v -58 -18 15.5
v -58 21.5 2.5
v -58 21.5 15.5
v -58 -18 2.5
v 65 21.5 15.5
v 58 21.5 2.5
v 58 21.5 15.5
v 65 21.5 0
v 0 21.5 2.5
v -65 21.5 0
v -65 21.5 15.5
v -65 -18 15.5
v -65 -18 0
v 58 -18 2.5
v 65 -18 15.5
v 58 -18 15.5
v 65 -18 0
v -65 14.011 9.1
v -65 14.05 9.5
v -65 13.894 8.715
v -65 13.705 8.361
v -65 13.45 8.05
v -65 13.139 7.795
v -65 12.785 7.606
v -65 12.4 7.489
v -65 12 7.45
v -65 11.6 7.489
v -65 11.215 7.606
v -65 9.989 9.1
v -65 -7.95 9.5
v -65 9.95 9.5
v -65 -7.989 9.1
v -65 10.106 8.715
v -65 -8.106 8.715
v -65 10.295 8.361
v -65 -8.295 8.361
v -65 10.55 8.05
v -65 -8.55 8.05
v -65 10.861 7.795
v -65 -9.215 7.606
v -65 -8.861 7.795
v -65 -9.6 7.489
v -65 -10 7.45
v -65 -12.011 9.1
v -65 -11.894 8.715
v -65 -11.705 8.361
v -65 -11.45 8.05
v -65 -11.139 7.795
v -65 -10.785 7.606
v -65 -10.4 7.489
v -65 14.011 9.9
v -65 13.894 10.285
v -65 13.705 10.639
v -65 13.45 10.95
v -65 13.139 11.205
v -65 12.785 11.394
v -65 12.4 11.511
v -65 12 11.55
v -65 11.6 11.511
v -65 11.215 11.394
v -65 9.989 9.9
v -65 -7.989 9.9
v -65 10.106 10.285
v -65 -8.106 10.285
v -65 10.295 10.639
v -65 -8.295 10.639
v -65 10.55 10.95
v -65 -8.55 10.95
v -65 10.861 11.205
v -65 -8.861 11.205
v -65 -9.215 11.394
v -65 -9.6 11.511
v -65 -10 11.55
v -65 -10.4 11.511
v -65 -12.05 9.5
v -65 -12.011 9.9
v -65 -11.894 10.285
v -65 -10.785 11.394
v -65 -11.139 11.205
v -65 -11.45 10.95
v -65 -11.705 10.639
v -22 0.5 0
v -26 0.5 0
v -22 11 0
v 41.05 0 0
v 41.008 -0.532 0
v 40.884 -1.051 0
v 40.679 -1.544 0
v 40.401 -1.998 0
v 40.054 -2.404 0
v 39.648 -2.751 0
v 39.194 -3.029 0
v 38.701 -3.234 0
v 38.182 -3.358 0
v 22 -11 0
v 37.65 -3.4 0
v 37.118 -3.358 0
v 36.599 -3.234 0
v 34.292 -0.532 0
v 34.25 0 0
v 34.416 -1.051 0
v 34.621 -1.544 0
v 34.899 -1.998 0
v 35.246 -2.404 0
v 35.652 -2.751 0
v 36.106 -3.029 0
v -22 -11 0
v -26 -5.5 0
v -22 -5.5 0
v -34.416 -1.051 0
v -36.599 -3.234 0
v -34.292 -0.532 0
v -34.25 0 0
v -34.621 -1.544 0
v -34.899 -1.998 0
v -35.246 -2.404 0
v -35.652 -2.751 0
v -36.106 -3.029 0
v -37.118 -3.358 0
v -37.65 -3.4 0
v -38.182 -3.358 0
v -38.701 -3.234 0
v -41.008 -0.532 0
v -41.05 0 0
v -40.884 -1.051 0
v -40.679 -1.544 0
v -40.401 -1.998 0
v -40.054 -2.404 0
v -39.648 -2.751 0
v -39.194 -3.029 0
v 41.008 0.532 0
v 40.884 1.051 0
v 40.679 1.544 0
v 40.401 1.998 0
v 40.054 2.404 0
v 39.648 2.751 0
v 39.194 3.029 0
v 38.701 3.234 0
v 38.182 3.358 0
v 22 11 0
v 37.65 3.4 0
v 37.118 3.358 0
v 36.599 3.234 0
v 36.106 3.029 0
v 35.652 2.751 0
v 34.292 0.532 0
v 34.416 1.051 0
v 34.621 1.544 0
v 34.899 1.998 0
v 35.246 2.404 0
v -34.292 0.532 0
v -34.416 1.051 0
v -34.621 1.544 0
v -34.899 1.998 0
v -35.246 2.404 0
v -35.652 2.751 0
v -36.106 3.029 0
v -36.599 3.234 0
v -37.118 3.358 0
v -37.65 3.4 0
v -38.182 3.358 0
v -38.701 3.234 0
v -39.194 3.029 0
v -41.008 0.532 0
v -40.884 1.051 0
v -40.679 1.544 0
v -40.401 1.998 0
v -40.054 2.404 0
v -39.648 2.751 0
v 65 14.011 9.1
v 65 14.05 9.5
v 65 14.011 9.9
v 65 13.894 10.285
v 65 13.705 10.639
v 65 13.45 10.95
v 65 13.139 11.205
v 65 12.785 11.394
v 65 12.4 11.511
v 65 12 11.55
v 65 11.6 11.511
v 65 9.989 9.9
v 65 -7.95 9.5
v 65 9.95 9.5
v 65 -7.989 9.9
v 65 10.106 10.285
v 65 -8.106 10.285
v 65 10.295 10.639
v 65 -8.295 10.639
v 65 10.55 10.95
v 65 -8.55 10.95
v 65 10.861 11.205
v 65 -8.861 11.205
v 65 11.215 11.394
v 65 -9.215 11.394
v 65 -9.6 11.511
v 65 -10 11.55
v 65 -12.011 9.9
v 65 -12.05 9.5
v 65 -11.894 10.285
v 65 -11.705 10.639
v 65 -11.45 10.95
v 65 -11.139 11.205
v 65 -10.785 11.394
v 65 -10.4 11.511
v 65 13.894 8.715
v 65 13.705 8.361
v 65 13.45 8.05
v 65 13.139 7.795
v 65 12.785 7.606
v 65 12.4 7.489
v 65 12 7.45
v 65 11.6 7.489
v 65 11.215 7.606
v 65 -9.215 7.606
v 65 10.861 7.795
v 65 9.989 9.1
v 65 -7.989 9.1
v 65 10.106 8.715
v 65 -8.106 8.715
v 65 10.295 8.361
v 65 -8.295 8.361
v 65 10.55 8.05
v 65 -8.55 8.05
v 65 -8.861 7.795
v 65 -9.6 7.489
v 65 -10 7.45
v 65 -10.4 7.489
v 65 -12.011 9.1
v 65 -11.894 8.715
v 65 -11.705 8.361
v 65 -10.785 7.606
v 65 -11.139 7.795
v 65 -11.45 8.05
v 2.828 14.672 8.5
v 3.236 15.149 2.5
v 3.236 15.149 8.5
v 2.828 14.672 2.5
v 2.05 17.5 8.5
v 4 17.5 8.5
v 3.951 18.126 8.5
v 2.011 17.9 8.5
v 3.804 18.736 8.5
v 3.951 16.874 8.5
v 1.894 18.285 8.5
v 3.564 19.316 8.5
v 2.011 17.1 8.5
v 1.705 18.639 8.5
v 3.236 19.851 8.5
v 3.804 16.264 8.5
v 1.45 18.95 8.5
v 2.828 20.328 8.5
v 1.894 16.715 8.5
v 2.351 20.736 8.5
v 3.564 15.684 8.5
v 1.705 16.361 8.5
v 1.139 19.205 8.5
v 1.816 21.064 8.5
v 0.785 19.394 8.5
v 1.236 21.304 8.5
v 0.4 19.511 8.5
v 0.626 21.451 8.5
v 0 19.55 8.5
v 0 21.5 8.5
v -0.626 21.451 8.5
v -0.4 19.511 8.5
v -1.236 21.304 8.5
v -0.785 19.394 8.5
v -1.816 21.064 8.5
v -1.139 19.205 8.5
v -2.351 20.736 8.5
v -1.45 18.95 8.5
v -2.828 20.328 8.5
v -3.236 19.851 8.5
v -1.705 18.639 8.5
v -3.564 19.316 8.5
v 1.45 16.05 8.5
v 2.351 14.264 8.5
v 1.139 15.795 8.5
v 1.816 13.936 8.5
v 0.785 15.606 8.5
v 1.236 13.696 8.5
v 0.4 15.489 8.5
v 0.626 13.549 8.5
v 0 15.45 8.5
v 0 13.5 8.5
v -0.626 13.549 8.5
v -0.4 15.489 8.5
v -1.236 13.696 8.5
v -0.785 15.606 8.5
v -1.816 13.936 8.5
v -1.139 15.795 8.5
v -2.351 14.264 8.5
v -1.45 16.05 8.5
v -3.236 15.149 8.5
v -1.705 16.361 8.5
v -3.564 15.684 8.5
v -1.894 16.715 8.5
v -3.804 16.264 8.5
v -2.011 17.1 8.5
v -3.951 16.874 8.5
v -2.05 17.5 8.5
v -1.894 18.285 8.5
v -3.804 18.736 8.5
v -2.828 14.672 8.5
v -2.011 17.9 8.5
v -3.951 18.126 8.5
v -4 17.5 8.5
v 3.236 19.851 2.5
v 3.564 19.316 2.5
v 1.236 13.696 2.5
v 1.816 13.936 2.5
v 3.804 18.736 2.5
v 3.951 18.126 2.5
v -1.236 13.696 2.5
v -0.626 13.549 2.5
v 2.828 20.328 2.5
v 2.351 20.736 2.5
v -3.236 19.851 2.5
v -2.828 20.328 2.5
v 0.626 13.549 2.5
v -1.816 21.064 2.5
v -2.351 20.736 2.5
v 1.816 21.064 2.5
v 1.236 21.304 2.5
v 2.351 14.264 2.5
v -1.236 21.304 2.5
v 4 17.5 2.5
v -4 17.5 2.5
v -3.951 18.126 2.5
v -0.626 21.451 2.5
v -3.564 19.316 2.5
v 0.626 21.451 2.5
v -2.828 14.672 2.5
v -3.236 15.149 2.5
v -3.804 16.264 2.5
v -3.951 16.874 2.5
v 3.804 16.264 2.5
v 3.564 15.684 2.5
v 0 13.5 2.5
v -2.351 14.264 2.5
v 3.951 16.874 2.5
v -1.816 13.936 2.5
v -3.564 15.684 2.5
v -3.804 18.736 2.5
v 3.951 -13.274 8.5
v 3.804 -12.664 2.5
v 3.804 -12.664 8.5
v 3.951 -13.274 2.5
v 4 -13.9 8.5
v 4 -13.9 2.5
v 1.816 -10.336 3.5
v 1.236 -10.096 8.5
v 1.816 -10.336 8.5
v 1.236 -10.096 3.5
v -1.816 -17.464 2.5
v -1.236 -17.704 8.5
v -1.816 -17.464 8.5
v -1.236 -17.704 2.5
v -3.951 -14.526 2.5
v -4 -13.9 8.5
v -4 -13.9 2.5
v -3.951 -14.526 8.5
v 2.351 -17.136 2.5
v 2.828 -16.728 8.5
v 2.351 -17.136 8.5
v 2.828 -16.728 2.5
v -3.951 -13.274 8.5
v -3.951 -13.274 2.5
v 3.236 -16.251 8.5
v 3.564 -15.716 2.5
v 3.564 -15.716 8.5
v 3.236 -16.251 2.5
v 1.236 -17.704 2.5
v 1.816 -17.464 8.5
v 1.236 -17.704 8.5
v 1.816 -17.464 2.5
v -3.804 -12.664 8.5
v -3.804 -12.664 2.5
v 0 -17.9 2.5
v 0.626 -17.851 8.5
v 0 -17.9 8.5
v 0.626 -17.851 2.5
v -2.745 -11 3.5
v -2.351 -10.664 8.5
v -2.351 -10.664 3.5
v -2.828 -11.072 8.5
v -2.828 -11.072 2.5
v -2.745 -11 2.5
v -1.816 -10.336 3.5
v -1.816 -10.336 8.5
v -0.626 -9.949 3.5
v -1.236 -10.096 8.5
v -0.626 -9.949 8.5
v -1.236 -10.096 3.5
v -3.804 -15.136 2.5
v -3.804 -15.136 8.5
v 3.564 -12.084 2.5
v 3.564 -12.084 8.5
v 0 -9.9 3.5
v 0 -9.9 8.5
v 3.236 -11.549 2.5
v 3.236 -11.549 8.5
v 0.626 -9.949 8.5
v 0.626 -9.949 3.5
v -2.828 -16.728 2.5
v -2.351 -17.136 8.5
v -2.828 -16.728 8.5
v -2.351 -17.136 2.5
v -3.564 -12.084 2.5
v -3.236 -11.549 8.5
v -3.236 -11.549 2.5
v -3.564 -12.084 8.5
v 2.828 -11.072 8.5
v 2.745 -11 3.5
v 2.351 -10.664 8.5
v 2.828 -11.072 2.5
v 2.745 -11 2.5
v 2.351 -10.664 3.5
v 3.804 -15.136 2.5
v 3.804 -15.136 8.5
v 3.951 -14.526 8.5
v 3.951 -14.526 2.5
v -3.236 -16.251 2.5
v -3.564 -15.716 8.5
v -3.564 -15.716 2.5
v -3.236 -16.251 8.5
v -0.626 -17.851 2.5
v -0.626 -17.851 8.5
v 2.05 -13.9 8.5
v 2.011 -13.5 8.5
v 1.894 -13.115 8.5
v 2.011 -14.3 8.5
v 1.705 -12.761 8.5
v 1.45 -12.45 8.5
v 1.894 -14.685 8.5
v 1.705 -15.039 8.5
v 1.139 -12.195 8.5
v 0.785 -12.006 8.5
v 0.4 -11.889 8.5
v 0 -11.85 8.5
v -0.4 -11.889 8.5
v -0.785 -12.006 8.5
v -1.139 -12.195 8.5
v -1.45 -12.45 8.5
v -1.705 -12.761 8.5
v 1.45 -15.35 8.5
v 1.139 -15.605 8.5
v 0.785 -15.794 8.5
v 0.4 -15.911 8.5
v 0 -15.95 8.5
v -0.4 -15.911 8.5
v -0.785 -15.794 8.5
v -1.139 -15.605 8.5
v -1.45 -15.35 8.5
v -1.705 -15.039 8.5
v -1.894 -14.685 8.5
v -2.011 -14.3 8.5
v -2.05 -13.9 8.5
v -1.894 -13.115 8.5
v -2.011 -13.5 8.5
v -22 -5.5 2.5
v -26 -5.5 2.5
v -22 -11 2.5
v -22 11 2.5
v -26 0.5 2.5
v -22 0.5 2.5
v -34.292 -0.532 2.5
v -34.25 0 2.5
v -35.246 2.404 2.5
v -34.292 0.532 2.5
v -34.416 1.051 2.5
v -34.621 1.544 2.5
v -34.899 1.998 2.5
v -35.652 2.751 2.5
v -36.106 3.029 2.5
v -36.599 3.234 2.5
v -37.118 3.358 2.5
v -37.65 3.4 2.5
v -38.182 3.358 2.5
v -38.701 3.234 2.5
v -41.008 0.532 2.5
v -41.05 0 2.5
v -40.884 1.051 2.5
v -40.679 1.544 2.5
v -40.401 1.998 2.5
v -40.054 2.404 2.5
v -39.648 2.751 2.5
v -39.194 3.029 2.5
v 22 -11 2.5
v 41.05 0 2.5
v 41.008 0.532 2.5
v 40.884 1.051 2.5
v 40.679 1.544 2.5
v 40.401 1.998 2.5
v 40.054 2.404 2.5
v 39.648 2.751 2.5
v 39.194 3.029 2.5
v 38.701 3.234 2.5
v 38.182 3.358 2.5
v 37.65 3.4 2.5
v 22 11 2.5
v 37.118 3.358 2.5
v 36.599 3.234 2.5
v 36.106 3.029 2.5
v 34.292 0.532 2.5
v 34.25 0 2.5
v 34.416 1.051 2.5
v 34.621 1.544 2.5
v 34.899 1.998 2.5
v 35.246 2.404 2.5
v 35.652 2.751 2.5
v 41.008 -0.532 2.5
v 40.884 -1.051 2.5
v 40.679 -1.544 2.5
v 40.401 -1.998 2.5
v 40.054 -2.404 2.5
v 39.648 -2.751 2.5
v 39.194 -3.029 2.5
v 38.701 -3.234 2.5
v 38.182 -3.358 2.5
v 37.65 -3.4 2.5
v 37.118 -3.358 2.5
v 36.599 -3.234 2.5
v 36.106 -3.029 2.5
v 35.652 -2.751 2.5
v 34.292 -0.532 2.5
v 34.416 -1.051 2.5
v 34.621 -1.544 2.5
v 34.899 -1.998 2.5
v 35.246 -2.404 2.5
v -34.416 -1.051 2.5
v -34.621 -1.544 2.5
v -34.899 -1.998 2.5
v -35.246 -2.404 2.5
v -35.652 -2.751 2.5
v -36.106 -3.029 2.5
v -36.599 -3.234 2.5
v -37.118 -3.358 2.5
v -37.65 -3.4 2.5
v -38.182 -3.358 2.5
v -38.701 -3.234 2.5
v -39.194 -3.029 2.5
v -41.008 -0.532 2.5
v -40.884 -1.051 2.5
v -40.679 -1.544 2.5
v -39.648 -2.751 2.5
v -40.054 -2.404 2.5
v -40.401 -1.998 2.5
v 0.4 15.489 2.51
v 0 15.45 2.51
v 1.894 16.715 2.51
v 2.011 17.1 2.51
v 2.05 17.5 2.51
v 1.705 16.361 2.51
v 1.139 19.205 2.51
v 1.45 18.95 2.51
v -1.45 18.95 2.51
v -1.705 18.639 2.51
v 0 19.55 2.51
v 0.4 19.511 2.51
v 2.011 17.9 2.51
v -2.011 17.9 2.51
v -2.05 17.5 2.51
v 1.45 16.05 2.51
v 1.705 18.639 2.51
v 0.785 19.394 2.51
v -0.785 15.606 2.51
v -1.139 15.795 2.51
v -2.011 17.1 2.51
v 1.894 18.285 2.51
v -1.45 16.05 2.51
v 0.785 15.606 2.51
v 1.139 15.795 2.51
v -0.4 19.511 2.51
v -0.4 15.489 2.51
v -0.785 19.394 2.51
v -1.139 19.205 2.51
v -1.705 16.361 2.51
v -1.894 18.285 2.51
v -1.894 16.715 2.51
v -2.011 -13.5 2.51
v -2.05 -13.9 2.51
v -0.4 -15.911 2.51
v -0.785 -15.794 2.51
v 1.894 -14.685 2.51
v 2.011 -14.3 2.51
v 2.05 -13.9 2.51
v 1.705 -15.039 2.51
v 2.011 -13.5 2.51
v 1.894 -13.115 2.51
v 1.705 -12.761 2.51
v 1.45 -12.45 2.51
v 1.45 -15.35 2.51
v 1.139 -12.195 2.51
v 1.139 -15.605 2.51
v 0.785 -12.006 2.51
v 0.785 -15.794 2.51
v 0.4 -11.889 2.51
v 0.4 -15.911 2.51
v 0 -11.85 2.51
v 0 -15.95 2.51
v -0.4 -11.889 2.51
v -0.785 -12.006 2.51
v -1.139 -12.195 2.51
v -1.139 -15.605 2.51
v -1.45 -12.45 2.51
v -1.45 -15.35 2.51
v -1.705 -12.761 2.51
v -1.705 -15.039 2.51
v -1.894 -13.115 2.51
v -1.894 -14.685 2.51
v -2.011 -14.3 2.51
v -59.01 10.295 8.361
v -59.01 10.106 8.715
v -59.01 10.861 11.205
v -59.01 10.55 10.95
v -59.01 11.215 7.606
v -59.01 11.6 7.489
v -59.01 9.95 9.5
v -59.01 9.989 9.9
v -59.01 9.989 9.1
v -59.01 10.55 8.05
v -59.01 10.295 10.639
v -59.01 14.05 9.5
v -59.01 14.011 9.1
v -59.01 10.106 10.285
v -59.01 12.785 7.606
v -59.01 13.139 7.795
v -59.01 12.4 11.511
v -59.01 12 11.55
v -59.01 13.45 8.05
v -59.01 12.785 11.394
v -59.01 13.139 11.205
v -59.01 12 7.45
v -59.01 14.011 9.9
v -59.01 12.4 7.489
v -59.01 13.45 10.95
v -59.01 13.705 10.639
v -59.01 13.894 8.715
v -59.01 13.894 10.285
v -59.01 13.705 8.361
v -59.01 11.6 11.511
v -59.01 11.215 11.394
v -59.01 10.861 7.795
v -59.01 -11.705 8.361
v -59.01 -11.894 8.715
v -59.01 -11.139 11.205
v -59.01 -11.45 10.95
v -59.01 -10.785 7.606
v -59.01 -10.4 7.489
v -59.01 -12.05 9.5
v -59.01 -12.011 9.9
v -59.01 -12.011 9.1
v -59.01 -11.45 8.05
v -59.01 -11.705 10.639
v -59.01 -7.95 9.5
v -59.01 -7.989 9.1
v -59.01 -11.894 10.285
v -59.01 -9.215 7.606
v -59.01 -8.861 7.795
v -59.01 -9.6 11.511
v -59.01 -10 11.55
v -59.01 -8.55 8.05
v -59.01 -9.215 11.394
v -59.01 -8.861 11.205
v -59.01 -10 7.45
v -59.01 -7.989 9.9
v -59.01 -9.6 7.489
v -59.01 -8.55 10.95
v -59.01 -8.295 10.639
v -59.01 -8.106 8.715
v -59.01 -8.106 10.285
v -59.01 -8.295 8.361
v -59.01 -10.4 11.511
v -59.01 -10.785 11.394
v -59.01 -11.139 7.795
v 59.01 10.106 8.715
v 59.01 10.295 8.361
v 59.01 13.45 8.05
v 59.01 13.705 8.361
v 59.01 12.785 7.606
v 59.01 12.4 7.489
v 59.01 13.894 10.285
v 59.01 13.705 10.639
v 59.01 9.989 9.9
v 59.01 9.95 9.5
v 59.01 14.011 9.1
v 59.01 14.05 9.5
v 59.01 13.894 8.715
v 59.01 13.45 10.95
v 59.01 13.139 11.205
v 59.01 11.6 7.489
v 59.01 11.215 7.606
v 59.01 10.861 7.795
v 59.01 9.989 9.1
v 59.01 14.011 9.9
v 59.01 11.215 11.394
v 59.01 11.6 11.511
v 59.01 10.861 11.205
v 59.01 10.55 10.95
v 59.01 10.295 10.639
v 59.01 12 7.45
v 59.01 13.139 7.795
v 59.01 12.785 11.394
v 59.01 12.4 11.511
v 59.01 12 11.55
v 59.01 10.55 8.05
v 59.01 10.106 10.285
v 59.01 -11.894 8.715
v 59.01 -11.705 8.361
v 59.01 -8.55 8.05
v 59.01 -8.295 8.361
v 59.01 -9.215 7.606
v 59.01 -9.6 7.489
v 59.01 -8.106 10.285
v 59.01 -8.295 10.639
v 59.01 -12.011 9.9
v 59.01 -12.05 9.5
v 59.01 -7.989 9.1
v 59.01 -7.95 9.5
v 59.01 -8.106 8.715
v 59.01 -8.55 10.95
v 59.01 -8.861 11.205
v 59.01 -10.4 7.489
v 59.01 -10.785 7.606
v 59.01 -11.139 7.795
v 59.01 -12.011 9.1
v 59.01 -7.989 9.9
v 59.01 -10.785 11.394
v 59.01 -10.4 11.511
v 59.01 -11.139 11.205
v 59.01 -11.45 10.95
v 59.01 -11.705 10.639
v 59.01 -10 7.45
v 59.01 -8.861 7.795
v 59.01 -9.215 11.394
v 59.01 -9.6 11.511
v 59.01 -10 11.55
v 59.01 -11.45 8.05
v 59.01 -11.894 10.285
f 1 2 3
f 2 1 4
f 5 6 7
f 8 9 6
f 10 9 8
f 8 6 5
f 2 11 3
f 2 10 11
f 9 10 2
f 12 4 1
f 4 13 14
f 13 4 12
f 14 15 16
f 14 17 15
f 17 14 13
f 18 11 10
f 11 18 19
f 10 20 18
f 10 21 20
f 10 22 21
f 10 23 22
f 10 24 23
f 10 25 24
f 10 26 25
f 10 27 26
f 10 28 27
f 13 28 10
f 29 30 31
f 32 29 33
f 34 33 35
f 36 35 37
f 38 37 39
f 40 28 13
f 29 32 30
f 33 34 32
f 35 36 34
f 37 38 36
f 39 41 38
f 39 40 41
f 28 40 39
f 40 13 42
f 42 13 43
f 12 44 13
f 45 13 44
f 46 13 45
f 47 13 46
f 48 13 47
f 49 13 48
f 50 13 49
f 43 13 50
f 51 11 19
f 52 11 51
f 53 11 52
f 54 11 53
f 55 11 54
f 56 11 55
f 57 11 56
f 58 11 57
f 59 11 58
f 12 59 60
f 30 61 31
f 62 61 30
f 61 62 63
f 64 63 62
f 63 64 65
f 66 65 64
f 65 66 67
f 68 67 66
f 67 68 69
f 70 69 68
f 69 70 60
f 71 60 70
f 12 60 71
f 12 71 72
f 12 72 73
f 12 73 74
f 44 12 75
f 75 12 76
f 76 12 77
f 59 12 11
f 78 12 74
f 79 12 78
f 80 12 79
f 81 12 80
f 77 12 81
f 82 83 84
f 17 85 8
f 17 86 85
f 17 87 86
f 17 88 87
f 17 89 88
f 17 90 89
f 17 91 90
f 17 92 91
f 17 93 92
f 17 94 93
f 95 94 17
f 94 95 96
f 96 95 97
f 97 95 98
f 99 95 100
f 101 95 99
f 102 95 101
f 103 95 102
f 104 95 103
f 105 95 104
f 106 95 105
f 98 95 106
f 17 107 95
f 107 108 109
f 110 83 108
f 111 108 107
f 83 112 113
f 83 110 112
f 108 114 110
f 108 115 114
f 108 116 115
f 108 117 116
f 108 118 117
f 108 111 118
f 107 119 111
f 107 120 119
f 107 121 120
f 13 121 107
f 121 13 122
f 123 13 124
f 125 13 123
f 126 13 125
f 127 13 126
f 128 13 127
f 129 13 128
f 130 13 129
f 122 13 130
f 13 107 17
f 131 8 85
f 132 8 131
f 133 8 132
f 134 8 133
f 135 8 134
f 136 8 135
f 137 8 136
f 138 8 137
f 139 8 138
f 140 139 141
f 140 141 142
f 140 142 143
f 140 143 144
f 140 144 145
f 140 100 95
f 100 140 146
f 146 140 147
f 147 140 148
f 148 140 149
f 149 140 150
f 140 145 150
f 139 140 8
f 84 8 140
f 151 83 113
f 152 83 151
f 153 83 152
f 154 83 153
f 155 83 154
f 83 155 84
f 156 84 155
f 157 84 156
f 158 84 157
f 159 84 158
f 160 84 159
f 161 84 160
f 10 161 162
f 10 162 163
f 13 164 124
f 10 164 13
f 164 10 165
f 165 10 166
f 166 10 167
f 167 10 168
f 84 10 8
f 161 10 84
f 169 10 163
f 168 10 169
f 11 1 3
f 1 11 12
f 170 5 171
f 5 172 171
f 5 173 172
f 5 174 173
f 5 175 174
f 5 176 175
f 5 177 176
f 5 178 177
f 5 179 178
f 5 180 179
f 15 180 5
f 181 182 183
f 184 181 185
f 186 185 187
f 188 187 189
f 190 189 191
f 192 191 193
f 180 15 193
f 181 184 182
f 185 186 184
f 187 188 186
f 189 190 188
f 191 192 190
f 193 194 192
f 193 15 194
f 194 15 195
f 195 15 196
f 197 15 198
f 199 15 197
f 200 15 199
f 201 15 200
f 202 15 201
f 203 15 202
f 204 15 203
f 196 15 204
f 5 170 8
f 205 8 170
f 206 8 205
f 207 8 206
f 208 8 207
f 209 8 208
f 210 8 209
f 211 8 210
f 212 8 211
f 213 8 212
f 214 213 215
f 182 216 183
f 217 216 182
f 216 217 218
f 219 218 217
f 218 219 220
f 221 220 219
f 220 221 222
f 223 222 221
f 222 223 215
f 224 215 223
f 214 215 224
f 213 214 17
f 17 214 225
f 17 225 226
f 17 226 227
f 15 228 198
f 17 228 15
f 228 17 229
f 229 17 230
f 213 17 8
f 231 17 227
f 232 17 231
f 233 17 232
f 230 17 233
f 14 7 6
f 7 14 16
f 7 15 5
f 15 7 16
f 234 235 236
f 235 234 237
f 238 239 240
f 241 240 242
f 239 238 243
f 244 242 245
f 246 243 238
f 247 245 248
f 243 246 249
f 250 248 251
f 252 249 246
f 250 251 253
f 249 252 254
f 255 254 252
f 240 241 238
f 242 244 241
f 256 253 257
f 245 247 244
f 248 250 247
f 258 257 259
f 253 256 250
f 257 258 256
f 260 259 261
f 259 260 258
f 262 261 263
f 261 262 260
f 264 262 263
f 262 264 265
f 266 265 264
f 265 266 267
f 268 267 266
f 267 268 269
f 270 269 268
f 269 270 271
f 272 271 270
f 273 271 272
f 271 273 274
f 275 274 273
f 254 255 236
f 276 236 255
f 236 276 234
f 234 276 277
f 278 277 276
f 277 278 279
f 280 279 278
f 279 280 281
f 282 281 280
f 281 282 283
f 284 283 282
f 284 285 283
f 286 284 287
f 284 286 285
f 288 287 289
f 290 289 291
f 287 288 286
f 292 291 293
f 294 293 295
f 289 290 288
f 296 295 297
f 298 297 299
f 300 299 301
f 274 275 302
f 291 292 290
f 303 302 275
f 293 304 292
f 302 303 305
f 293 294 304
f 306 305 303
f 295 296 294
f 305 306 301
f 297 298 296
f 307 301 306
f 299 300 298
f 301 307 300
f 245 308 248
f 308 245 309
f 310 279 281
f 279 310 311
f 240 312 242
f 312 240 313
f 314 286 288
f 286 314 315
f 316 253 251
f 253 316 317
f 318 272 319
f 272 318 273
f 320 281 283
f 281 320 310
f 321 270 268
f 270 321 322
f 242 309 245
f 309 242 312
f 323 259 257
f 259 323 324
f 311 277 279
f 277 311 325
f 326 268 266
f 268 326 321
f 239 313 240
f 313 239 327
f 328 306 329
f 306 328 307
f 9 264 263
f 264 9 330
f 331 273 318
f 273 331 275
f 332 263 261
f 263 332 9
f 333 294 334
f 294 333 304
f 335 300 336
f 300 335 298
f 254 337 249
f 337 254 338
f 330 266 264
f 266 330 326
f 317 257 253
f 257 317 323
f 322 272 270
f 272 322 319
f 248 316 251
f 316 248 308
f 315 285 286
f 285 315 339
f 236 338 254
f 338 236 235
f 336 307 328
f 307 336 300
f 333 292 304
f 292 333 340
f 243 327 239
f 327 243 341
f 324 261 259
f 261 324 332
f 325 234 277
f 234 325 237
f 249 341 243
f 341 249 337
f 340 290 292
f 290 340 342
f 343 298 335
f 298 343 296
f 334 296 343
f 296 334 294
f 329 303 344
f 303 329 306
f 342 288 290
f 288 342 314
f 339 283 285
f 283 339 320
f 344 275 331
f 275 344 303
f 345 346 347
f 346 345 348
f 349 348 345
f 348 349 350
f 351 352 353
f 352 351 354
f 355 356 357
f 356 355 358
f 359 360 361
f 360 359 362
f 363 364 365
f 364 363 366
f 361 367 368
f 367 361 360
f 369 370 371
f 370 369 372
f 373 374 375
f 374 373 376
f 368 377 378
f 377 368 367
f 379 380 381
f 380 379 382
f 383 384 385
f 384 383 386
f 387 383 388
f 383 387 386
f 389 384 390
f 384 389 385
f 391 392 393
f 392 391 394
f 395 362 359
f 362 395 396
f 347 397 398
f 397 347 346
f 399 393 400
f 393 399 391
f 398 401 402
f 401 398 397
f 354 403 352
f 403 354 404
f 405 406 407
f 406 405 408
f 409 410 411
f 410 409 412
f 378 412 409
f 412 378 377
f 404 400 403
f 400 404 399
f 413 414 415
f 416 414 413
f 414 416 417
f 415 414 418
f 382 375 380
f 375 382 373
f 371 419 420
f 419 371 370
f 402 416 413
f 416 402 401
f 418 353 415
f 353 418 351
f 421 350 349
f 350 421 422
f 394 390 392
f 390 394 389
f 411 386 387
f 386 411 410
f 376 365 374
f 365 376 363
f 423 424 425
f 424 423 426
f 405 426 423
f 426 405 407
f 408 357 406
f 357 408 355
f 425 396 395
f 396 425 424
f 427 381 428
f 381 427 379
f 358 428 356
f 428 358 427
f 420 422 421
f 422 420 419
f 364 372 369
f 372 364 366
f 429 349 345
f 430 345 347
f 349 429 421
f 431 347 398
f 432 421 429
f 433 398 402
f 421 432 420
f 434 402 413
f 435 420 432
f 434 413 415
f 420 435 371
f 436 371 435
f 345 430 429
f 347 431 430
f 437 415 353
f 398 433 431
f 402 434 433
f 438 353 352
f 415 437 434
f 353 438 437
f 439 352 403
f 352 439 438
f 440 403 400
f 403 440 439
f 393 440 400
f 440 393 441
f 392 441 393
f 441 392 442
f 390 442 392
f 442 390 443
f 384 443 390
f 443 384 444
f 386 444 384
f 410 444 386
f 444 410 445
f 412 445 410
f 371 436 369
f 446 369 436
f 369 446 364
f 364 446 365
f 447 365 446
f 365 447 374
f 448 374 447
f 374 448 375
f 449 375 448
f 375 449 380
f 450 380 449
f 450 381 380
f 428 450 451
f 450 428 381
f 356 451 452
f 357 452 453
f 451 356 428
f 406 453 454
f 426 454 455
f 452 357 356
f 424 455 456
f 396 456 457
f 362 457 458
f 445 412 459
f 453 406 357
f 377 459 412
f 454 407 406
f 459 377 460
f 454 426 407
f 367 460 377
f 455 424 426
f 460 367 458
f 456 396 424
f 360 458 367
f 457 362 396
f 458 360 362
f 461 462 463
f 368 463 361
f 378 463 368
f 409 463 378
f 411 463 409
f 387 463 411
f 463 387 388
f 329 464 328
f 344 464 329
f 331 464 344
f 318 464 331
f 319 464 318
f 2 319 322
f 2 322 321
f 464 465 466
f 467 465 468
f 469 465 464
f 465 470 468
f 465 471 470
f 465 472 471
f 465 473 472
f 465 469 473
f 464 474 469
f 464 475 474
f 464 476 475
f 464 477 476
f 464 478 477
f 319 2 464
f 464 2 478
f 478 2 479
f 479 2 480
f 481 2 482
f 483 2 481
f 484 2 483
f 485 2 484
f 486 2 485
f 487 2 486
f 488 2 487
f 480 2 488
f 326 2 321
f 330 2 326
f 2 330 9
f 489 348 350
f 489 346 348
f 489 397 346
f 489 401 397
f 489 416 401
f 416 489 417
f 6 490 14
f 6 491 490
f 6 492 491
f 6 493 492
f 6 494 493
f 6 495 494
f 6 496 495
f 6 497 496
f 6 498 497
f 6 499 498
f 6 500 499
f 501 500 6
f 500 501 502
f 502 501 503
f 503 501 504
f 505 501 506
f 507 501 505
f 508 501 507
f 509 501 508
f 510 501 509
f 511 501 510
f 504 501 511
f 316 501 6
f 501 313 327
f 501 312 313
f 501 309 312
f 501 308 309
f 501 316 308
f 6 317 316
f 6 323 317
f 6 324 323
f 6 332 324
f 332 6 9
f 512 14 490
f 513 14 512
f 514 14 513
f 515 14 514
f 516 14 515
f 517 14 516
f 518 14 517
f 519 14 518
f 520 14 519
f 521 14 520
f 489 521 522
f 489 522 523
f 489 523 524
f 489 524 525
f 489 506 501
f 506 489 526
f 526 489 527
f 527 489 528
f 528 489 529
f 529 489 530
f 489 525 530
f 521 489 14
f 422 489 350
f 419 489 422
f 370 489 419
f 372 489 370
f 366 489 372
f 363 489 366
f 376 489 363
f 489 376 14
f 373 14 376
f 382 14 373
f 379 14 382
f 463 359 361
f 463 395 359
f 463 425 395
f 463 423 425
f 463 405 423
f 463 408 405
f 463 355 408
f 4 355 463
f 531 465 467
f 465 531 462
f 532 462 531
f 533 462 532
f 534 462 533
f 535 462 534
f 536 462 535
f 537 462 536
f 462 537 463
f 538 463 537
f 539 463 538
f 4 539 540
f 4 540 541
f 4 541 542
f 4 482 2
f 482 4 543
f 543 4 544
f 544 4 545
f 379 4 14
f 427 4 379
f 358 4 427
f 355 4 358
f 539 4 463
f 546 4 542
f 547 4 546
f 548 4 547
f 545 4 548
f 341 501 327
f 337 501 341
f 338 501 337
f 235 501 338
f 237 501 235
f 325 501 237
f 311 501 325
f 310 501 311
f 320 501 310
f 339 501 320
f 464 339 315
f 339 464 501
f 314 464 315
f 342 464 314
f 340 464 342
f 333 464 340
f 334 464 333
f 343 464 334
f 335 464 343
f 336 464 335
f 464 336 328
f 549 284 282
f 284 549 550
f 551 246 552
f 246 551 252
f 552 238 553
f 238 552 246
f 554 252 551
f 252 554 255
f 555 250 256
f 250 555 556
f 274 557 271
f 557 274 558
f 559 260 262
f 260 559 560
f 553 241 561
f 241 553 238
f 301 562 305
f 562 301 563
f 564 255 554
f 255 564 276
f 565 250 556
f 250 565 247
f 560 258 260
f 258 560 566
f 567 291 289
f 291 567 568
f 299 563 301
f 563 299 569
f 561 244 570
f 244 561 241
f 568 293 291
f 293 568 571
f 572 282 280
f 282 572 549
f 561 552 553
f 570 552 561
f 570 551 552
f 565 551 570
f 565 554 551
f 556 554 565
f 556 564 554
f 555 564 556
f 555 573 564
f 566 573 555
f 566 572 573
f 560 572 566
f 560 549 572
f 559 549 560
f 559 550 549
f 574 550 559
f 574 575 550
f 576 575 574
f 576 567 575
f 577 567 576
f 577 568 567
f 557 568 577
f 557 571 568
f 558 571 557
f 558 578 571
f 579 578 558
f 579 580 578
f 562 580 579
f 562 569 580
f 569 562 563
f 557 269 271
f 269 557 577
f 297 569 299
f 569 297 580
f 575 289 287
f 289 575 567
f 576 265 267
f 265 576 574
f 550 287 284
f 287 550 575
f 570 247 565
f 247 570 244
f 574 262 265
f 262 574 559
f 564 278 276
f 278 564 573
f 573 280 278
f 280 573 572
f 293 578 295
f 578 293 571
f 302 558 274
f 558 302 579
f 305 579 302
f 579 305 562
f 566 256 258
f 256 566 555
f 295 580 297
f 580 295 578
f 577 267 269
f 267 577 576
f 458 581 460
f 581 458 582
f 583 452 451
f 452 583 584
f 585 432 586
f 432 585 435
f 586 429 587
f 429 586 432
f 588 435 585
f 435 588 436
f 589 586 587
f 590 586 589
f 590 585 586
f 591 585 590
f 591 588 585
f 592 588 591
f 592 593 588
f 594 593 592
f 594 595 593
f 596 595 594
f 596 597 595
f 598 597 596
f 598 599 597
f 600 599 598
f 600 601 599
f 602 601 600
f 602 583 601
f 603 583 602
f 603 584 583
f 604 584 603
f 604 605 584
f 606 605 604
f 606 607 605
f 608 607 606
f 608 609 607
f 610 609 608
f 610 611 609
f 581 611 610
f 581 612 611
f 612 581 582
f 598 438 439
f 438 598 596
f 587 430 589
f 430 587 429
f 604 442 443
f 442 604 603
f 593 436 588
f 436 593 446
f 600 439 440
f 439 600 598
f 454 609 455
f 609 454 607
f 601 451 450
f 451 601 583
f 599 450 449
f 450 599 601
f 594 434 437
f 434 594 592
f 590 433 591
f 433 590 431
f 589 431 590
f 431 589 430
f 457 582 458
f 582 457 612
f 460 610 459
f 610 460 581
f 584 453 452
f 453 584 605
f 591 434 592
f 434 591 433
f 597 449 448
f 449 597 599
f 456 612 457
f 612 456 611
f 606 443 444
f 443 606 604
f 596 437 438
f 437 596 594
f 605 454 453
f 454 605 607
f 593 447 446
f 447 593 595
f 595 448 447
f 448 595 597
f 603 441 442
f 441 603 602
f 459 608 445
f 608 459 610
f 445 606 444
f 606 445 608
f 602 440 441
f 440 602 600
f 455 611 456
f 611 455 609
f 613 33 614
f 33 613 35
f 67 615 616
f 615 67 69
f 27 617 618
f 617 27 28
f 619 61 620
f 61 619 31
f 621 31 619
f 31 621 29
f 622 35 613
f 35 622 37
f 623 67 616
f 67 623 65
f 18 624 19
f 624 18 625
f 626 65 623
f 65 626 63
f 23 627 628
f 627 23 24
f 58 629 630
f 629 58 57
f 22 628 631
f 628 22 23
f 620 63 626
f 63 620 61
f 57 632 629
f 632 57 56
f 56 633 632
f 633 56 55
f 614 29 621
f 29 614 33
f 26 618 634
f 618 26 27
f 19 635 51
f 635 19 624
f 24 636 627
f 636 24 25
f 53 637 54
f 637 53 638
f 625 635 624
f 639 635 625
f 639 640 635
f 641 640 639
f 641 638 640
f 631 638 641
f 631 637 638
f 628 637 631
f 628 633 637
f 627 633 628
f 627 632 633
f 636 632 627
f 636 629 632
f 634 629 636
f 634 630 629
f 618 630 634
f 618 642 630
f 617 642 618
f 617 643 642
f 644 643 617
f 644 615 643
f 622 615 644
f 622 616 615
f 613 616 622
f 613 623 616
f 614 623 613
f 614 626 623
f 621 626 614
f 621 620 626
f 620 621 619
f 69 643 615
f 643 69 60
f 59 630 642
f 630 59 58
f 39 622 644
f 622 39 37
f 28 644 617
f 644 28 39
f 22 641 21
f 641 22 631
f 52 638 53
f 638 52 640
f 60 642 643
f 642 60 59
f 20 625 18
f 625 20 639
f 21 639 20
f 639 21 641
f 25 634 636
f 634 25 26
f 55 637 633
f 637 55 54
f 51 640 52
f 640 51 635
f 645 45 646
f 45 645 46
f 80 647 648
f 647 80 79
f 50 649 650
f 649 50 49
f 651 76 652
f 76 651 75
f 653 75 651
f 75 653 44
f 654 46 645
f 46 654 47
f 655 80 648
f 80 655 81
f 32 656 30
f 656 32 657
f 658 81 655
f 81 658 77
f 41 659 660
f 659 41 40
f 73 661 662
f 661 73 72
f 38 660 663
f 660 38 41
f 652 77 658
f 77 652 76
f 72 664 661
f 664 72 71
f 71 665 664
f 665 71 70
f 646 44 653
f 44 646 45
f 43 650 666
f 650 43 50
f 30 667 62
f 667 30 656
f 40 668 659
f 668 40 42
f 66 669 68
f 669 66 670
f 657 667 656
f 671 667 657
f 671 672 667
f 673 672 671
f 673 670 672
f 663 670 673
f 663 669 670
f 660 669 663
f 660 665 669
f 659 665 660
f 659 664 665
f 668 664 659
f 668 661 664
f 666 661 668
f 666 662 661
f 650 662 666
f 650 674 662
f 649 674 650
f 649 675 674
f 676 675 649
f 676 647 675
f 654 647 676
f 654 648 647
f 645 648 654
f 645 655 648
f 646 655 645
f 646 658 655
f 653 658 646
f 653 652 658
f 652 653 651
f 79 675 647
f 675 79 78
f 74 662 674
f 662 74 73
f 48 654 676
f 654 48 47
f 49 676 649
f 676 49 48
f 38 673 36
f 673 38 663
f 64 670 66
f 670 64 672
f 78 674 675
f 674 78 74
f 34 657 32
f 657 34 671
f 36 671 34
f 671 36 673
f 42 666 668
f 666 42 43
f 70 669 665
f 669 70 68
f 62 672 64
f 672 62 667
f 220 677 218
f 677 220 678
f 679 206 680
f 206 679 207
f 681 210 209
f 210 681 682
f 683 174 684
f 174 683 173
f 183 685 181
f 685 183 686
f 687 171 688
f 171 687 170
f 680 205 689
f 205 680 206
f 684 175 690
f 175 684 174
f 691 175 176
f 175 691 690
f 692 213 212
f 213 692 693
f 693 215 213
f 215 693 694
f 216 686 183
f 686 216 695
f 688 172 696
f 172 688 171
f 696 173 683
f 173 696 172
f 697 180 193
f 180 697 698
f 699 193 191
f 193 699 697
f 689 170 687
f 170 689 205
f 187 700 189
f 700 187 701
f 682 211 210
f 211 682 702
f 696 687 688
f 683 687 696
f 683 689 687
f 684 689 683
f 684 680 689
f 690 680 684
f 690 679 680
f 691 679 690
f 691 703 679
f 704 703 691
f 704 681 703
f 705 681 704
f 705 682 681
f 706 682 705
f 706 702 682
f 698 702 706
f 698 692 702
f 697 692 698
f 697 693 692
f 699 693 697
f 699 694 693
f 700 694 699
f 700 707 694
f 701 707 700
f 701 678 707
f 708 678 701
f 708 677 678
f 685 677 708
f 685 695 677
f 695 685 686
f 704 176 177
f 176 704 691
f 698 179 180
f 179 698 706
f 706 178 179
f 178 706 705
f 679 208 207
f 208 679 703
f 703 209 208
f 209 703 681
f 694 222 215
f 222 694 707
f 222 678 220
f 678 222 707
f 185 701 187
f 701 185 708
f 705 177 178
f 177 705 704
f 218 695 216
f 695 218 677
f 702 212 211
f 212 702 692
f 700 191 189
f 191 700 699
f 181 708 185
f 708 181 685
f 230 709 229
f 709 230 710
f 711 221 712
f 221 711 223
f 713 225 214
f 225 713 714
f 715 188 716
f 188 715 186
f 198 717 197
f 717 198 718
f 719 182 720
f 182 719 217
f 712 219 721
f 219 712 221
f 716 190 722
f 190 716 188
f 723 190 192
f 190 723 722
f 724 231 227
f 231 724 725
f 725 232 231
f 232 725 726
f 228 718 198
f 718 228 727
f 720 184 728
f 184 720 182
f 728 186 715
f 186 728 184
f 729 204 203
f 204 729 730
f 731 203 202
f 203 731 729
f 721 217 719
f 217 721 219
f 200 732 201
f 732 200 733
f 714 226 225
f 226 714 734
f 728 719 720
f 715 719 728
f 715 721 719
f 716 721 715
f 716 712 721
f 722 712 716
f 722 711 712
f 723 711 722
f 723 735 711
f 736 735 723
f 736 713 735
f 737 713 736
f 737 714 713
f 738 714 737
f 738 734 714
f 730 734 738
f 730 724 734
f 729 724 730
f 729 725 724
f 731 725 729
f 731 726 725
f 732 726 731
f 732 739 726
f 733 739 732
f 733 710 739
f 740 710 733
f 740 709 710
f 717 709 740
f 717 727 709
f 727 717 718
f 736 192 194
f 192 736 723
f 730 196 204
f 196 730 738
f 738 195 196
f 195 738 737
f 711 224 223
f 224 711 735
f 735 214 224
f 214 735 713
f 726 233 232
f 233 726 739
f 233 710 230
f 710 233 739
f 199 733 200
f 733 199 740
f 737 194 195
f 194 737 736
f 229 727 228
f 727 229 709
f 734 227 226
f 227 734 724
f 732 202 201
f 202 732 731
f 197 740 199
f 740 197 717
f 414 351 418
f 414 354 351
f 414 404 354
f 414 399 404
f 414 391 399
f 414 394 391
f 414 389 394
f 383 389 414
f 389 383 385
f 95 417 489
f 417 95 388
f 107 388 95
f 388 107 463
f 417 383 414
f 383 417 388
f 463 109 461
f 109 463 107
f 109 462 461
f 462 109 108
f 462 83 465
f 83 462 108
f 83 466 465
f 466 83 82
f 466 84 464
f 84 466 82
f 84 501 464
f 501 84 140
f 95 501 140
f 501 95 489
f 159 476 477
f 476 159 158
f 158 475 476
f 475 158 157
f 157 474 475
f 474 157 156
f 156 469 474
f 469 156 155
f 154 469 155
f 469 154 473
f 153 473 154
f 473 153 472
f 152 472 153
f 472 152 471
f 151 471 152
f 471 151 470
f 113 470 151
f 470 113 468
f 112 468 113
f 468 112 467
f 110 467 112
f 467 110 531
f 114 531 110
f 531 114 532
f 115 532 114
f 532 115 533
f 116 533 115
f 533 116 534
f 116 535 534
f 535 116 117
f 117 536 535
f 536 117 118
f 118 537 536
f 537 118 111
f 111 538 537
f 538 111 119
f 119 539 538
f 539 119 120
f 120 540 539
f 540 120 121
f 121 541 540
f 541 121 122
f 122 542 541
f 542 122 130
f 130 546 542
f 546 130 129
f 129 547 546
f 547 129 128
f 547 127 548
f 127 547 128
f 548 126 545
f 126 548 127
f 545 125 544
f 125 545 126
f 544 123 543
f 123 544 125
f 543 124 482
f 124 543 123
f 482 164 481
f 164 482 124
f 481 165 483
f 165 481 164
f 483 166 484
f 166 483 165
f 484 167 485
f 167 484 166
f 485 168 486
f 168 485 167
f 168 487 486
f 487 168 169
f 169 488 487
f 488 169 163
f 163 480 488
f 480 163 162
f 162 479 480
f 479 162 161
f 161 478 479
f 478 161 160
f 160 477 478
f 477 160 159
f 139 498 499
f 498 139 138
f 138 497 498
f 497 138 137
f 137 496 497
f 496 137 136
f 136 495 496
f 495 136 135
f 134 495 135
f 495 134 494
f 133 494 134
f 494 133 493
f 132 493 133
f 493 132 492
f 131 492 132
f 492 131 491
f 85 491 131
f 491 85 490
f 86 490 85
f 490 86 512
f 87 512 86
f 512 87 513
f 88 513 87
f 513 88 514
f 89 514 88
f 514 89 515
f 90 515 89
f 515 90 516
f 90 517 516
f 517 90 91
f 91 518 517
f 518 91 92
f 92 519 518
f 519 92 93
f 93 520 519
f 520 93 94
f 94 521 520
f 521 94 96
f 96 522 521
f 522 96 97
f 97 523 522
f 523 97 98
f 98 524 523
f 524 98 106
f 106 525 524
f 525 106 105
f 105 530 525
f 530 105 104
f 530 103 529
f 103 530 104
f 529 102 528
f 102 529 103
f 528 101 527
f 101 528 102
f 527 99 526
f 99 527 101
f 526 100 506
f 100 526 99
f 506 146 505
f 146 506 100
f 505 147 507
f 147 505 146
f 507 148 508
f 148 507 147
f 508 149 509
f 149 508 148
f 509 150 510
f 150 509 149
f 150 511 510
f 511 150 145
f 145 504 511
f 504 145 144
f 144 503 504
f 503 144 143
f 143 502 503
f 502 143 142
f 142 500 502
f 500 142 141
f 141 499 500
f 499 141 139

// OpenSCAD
// file: ../head.scad
// Head - shared dimensions for the face plate, shell, camera plate and floor (concept:
// concepts/head_brow_concept.scad). The head sits straight on the turntable plate, no neck.
//
// Frame: origin at the centre of the turntable plate's top; +Y = front (face), +Z = up.
//
//   FACE   head_face.scad: the front of the box part - two round GC9A01 eyes and the 2.08" OLED
//          mouth, each dropped into a pocket from behind (it centres them) and hot-glued
//   SHELL  head_shell.scad: sides, back and the ARCH on top (a half cylinder across the full width
//          and depth); the camera looks out of a small window in the arch's front curve
//   CAMERA head_cam_plate.scad: holds the bare C920 board at cam_tilt, screwed inside the arch
//   FLOOR  head_floor.scad: screws to the turntable plate; the head ESP32-S3 sits on it
include <params.scad>

// ---- outline ------------------------------------------------------------------------------------
hb_w     = 135;              // width (X)
hb_d     = 70;               // depth (Y)
box_h    = 88;               // the box part (face height); the arch adds arch_r on top -> 123
hb_r     = 20;               // bottom corners, seen from the front (the top meets the arch square)
hb_wall  = 2.5;              // shell walls
arch_r   = hb_d / 2;         // 35: the arch spans the full depth; its axis runs along X at
arch_z   = box_h;            //   y = 0, z = box_h
face_t   = 3.0;              // face plate
face_y   = hb_d / 2;         // 35: front surface of the face

// ---- eyes (module dims: params.scad eye_*) ------------------------------------------------------
eye_dx    = 32;              // eye centres at x = +/- eye_dx
eye_z     = 55;              // eye centre height. Modules mount UPSIDE DOWN (pin tab up; the image
                             //   is flipped in software): the tab then points into the free space
                             //   under the arch, away from the mouth
eye_win   = 34;              // window: the 32.4 mm picture + a thin black margin of glass; hides the
                             //   glass edge and its flex cable
eye_skin  = 1.2;             // face material in front of the display
eye_pocket = eye_board_d + 0.5;     // the board drops into this and centres the display
eye_depth = eye_t + 0.3;     // pocket depth behind the skin

// ---- mouth: 2.08" OLED (params.scad oled_*) ---------------------------------------------------------
mouth_z   = 23;              // centre of the visible area: the module's lower edge clears the floor's tabs
mouth_pin = -1;              // the module's pin end points to -X (seen from the front: the left)
m_win     = oled_va + [0.6, 0.6];   // window: the visible area + 0.3 each side
m_skin    = 1.2;
// along X, from the visible area's centre: the glass's and the board's centres (pins at -X)
m_glass_dx = -mouth_pin * (oled_glass_x + oled_glass[0] / 2 - (oled_va_x + oled_va[0] / 2));   // +2.56
m_pcb_dx   = -mouth_pin * (oled_pcb[0] / 2 - (oled_va_x + oled_va[0] / 2));                     // +1.82

// ---- camera: bare C920 board, in the arch ----------------------------------------------------------
cam_tilt  = 18;              // fixed, up. Lens ~278 mm above the desk: eyes 300-500 mm high at
                             //   300-600 mm are 2..37 deg up; the 43 deg view (16:9) at 18 covers -3..40
cam_board = [80, 22];        // MEASURED (eye_test_stand.scad)
cam_board_t = 1.3;
cam_lens_h  = 14.0;          // board front -> front of the lens
cam_lens_d  = 11;            // lens barrel across its flanges
cam_win     = cam_lens_d + 2 * 2;   // window round the lens (eye test stand, print 2: small is best)
cam_recess  = 0.5;           // lens front this far inside the arch's surface
// the lens axis runs radially out of the arch at cam_tilt: lens front at arch_r - cam_recess
cam_r_lens  = arch_r - cam_recess;                  // 34.5 from the arch axis
cam_r_board = cam_r_lens - cam_lens_h;              // 20.5: board front

// ---- joints -------------------------------------------------------------------------------------------
// face plate -> shell: four M3 screws from inside, through tabs on the shell, into inserts in the
// face's bosses
face_boss_d   = 8;
face_boss_len = 9;           // behind the face's back
face_bosses   = [[-55, 14], [55, 14], [-58, 64], [58, 64]];   // (x, z): the upper pair low enough to
                                                                //   clear the camera plate's flanges

// floor: head_floor.scad. It screws DOWN into four inserts in the turntable plate (head-frame
// positions below); the shell hooks onto it at the front (two tongues on the face plate into slots
// in the floor's front tabs) and screws to it at the back (two M3 through the back wall)
floor_t      = 4.5;          // pockets underneath clear the lazy Susan's M5 nuts + bolt tips
floor_clr    = 0.4;          // gap to the shell's walls, each side
floor_x      = 47;           // half-width: the shell's open bottom is +/-47.5 (rounded corners)
floor_y      = [-hb_d / 2 + hb_wall + floor_clr, face_y - face_t - floor_clr];
floor_mounts = [[-22, -22], [22, -22], [-22, 22], [22, 22]];  // M3 down into the turntable plate
head_rot_in_pulley = 45;     // the head's frame in turntable_pulley.scad's: there the motor is at 0 deg
                             //   when the head looks ahead, and Level 2 has it at motor_a = -45, so the
                             //   head's +Y (90 deg) is at 135
floor_nuts   = [[-50.5, 0], [50.5, 0]];   // the turntable plate's M5 nuts under the floor
floor_hole_d = 40;           // cables down into the turntable's hollow tube
back_screws  = [-30, 30];    // x of the two M3 screws through the back wall
back_screw_z = 10;
tongue_x     = [-30, 30];    // the face plate's tongues
tongue       = [10, 3, 7];   // width (X), height (Z), length (Y, back from the face plate)
tongue_z     = 7;            // centre height (under the mouth's collar)
// the head ESP32-S3 (Seeed XIAO ESP32S3, 21 x 17.8): in a pocket on the floor, USB-C toward the hole
mcu          = [21.0, 17.8];
mcu_c        = [33, 0];      // centre; long axis along X, USB at the -X end

module rr2d(w, h, r) { offset(r = r) square([w - 2 * r, h - 2 * r], center = true); }

// front outline of the box part: rounded bottom corners, square top; z = 0 .. h
module low2d(w = hb_w, h = box_h, r = hb_r) {
    hull() {
        for (sx = [-1, 1]) translate([sx * (w / 2 - r), r]) circle(r = r, $fn = 96);
        translate([-w / 2, h - 1]) square([w, 1]);
    }
}

// where the lens sits: frame at the lens front, looking along +Y (rotated cam_tilt up)
module at_lens() {
    translate([0, 0, arch_z]) rotate([cam_tilt, 0, 0]) translate([0, cam_r_lens, 0]) children();
}
// file: ../head_cam.scad
// Head camera mount - shared by head_cam_plate.scad, head_cam_strap.scad and head_shell.scad.
//
// LENS FRAME: origin at the front of the lens; +Y = the view direction, +Z = "up" across the
// board, X = along the board (same X as the head). at_lens() (head.scad) places it in the head:
// the lens axis runs radially out of the arch, cam_tilt up.
//
// The bare C920 board (80 x 22) lies against the plate's BACK face, lens forward through it, as on
// the eye test stand (eye_test_stand.scad - its pocket / notch / bracket layout is proven):
//   * through the plate: the lens holder (square), the board's front parts (44 x 22), the coils'
//     bay, two notches for the microphones (they also index the board side to side)
//   * behind: two bosses with M3 inserts; a flat strap (head_cam_strap.scad) screws onto them
//     across the board's back, 1.7 mm clear of its back parts
//   * at each end a FLANGE against the side wall: two M3 screws from outside the head, through
//     the wall, into inserts in the flange
include <head.scad>

cam_plate_t  = 2.5;
cam_y_board  = -cam_lens_h;                 // -14: board front = plate back face
cam_y_front  = cam_y_board + cam_plate_t;   // -11.5: plate front face
cam_z_range  = [-18, 21.5];                 // plate extent across the board (Z): inside the arch
cam_x_flange = hb_w / 2 - hb_wall;          // 65: flange outer faces against the side walls
cam_flange_t = 7;                           // thick enough for an insert (bore along X)
cam_flange_y = [-27, cam_y_front];          // flange extent along Y
cam_mount_pts = [[-21, 12], [-21, -10]];    // [y, z] of the two screws in each flange
cam_lens_hole = 16.5;                       // square, for the 14 x 14 lens holder
cam_comp     = [44, 22];                    // the board's front parts (through)
cam_coil     = [4, 5];                      // bay off the pocket's -X side, from z = 0 up
cam_mic_d    = 6.1 + 0.7;
cam_mic_x    = 69.2 / 2 + 6.1 / 2;          // 37.65: microphone centres
cam_strap_holes = [17.5, -13.9];            // Z of the strap's screws (as the stand's bracket)
cam_boss_h   = 6;                           // bosses behind the plate: the strap lies on them
cam_boss_d   = 8;

// a point in the lens frame -> head frame (matches at_lens())
function cam_to_head(p) = let(y = p[1] + cam_r_lens, z = p[2])
    [p[0], y * cos(cam_tilt) - z * sin(cam_tilt), arch_z + y * sin(cam_tilt) + z * cos(cam_tilt)];
// main file
// Head camera plate - holds the bare C920 board in the arch, cam_tilt up, with its lens 0.5 mm
// inside the arch's window. See head_cam.scad for the layout. Fit: board onto the back face (mics
// into their notches), strap over it (head_cam_strap.scad, 2 x M3 into the bosses), USB wires round
// the board's top edge; then the plate into the shell from below, and four M3 x 10 screws from
// outside through the side walls into the flanges.
//
// PRINT front face down (as modelled in print orientation below): bosses and flanges stand up,
// no supports.
include <../head_cam.scad>

module cam_plate() {               // in the LENS frame
    difference() {
        union() {
            // the plate
            translate([-cam_x_flange + cam_flange_t, cam_y_board, cam_z_range[0]])
                cube([2 * (cam_x_flange - cam_flange_t), cam_plate_t, cam_z_range[1] - cam_z_range[0]]);
            // flanges against the side walls
            for (sx = [-1, 1]) translate([sx > 0 ? cam_x_flange - cam_flange_t : -cam_x_flange, cam_flange_y[0], cam_z_range[0]])
                cube([cam_flange_t, cam_flange_y[1] - cam_flange_y[0], cam_z_range[1] - cam_z_range[0]]);
            // strap bosses behind the plate
            for (z = cam_strap_holes) translate([0, cam_y_board + 0.01, z]) rotate([90, 0, 0])
                cylinder(d = cam_boss_d, h = cam_boss_h + 0.01, $fn = 40);
        }
        // lens holder, the board's front parts, coils, microphones: through the plate
        translate([0, cam_y_board - 1, 0]) rotate([-90, 0, 0]) linear_extrude(cam_plate_t + 2) {
            square(cam_lens_hole, center = true);
            square(cam_comp, center = true);
            translate([-cam_comp[0] / 2 - cam_coil[0], -0.5]) square([cam_coil[0] + 1, cam_coil[1] + 1]);
            for (sx = [-1, 1]) translate([sx * cam_mic_x, 0]) circle(d = cam_mic_d, $fn = 40);
        }
        // strap inserts (bore from the boss tops)
        for (z = cam_strap_holes) translate([0, cam_y_board - cam_boss_h - 0.01, z]) rotate([-90, 0, 0])
            cylinder(d = insert_m3[0], h = insert_m3[1] + 1, $fn = 32);
        // flange inserts (bore from the outer faces, along X)
        for (sx = [-1, 1], p = cam_mount_pts) translate([sx * (cam_x_flange + 0.01), p[0], p[1]])
            rotate([0, -sx * 90, 0]) cylinder(d = insert_m3[0], h = insert_m3[1] + 1, $fn = 32);
    }
}

// as printed: front face (lens frame +Y side) down
rotate([-90, 0, 0]) translate([0, -cam_y_front, 0]) cam_plate();

// ghost: the board in place
%rotate([-90, 0, 0]) translate([0, -cam_y_front, 0])
    translate([-cam_board[0] / 2, cam_y_board - cam_board_t, -cam_board[1] / 2]) cube([cam_board[0], cam_board_t, cam_board[1]]);
